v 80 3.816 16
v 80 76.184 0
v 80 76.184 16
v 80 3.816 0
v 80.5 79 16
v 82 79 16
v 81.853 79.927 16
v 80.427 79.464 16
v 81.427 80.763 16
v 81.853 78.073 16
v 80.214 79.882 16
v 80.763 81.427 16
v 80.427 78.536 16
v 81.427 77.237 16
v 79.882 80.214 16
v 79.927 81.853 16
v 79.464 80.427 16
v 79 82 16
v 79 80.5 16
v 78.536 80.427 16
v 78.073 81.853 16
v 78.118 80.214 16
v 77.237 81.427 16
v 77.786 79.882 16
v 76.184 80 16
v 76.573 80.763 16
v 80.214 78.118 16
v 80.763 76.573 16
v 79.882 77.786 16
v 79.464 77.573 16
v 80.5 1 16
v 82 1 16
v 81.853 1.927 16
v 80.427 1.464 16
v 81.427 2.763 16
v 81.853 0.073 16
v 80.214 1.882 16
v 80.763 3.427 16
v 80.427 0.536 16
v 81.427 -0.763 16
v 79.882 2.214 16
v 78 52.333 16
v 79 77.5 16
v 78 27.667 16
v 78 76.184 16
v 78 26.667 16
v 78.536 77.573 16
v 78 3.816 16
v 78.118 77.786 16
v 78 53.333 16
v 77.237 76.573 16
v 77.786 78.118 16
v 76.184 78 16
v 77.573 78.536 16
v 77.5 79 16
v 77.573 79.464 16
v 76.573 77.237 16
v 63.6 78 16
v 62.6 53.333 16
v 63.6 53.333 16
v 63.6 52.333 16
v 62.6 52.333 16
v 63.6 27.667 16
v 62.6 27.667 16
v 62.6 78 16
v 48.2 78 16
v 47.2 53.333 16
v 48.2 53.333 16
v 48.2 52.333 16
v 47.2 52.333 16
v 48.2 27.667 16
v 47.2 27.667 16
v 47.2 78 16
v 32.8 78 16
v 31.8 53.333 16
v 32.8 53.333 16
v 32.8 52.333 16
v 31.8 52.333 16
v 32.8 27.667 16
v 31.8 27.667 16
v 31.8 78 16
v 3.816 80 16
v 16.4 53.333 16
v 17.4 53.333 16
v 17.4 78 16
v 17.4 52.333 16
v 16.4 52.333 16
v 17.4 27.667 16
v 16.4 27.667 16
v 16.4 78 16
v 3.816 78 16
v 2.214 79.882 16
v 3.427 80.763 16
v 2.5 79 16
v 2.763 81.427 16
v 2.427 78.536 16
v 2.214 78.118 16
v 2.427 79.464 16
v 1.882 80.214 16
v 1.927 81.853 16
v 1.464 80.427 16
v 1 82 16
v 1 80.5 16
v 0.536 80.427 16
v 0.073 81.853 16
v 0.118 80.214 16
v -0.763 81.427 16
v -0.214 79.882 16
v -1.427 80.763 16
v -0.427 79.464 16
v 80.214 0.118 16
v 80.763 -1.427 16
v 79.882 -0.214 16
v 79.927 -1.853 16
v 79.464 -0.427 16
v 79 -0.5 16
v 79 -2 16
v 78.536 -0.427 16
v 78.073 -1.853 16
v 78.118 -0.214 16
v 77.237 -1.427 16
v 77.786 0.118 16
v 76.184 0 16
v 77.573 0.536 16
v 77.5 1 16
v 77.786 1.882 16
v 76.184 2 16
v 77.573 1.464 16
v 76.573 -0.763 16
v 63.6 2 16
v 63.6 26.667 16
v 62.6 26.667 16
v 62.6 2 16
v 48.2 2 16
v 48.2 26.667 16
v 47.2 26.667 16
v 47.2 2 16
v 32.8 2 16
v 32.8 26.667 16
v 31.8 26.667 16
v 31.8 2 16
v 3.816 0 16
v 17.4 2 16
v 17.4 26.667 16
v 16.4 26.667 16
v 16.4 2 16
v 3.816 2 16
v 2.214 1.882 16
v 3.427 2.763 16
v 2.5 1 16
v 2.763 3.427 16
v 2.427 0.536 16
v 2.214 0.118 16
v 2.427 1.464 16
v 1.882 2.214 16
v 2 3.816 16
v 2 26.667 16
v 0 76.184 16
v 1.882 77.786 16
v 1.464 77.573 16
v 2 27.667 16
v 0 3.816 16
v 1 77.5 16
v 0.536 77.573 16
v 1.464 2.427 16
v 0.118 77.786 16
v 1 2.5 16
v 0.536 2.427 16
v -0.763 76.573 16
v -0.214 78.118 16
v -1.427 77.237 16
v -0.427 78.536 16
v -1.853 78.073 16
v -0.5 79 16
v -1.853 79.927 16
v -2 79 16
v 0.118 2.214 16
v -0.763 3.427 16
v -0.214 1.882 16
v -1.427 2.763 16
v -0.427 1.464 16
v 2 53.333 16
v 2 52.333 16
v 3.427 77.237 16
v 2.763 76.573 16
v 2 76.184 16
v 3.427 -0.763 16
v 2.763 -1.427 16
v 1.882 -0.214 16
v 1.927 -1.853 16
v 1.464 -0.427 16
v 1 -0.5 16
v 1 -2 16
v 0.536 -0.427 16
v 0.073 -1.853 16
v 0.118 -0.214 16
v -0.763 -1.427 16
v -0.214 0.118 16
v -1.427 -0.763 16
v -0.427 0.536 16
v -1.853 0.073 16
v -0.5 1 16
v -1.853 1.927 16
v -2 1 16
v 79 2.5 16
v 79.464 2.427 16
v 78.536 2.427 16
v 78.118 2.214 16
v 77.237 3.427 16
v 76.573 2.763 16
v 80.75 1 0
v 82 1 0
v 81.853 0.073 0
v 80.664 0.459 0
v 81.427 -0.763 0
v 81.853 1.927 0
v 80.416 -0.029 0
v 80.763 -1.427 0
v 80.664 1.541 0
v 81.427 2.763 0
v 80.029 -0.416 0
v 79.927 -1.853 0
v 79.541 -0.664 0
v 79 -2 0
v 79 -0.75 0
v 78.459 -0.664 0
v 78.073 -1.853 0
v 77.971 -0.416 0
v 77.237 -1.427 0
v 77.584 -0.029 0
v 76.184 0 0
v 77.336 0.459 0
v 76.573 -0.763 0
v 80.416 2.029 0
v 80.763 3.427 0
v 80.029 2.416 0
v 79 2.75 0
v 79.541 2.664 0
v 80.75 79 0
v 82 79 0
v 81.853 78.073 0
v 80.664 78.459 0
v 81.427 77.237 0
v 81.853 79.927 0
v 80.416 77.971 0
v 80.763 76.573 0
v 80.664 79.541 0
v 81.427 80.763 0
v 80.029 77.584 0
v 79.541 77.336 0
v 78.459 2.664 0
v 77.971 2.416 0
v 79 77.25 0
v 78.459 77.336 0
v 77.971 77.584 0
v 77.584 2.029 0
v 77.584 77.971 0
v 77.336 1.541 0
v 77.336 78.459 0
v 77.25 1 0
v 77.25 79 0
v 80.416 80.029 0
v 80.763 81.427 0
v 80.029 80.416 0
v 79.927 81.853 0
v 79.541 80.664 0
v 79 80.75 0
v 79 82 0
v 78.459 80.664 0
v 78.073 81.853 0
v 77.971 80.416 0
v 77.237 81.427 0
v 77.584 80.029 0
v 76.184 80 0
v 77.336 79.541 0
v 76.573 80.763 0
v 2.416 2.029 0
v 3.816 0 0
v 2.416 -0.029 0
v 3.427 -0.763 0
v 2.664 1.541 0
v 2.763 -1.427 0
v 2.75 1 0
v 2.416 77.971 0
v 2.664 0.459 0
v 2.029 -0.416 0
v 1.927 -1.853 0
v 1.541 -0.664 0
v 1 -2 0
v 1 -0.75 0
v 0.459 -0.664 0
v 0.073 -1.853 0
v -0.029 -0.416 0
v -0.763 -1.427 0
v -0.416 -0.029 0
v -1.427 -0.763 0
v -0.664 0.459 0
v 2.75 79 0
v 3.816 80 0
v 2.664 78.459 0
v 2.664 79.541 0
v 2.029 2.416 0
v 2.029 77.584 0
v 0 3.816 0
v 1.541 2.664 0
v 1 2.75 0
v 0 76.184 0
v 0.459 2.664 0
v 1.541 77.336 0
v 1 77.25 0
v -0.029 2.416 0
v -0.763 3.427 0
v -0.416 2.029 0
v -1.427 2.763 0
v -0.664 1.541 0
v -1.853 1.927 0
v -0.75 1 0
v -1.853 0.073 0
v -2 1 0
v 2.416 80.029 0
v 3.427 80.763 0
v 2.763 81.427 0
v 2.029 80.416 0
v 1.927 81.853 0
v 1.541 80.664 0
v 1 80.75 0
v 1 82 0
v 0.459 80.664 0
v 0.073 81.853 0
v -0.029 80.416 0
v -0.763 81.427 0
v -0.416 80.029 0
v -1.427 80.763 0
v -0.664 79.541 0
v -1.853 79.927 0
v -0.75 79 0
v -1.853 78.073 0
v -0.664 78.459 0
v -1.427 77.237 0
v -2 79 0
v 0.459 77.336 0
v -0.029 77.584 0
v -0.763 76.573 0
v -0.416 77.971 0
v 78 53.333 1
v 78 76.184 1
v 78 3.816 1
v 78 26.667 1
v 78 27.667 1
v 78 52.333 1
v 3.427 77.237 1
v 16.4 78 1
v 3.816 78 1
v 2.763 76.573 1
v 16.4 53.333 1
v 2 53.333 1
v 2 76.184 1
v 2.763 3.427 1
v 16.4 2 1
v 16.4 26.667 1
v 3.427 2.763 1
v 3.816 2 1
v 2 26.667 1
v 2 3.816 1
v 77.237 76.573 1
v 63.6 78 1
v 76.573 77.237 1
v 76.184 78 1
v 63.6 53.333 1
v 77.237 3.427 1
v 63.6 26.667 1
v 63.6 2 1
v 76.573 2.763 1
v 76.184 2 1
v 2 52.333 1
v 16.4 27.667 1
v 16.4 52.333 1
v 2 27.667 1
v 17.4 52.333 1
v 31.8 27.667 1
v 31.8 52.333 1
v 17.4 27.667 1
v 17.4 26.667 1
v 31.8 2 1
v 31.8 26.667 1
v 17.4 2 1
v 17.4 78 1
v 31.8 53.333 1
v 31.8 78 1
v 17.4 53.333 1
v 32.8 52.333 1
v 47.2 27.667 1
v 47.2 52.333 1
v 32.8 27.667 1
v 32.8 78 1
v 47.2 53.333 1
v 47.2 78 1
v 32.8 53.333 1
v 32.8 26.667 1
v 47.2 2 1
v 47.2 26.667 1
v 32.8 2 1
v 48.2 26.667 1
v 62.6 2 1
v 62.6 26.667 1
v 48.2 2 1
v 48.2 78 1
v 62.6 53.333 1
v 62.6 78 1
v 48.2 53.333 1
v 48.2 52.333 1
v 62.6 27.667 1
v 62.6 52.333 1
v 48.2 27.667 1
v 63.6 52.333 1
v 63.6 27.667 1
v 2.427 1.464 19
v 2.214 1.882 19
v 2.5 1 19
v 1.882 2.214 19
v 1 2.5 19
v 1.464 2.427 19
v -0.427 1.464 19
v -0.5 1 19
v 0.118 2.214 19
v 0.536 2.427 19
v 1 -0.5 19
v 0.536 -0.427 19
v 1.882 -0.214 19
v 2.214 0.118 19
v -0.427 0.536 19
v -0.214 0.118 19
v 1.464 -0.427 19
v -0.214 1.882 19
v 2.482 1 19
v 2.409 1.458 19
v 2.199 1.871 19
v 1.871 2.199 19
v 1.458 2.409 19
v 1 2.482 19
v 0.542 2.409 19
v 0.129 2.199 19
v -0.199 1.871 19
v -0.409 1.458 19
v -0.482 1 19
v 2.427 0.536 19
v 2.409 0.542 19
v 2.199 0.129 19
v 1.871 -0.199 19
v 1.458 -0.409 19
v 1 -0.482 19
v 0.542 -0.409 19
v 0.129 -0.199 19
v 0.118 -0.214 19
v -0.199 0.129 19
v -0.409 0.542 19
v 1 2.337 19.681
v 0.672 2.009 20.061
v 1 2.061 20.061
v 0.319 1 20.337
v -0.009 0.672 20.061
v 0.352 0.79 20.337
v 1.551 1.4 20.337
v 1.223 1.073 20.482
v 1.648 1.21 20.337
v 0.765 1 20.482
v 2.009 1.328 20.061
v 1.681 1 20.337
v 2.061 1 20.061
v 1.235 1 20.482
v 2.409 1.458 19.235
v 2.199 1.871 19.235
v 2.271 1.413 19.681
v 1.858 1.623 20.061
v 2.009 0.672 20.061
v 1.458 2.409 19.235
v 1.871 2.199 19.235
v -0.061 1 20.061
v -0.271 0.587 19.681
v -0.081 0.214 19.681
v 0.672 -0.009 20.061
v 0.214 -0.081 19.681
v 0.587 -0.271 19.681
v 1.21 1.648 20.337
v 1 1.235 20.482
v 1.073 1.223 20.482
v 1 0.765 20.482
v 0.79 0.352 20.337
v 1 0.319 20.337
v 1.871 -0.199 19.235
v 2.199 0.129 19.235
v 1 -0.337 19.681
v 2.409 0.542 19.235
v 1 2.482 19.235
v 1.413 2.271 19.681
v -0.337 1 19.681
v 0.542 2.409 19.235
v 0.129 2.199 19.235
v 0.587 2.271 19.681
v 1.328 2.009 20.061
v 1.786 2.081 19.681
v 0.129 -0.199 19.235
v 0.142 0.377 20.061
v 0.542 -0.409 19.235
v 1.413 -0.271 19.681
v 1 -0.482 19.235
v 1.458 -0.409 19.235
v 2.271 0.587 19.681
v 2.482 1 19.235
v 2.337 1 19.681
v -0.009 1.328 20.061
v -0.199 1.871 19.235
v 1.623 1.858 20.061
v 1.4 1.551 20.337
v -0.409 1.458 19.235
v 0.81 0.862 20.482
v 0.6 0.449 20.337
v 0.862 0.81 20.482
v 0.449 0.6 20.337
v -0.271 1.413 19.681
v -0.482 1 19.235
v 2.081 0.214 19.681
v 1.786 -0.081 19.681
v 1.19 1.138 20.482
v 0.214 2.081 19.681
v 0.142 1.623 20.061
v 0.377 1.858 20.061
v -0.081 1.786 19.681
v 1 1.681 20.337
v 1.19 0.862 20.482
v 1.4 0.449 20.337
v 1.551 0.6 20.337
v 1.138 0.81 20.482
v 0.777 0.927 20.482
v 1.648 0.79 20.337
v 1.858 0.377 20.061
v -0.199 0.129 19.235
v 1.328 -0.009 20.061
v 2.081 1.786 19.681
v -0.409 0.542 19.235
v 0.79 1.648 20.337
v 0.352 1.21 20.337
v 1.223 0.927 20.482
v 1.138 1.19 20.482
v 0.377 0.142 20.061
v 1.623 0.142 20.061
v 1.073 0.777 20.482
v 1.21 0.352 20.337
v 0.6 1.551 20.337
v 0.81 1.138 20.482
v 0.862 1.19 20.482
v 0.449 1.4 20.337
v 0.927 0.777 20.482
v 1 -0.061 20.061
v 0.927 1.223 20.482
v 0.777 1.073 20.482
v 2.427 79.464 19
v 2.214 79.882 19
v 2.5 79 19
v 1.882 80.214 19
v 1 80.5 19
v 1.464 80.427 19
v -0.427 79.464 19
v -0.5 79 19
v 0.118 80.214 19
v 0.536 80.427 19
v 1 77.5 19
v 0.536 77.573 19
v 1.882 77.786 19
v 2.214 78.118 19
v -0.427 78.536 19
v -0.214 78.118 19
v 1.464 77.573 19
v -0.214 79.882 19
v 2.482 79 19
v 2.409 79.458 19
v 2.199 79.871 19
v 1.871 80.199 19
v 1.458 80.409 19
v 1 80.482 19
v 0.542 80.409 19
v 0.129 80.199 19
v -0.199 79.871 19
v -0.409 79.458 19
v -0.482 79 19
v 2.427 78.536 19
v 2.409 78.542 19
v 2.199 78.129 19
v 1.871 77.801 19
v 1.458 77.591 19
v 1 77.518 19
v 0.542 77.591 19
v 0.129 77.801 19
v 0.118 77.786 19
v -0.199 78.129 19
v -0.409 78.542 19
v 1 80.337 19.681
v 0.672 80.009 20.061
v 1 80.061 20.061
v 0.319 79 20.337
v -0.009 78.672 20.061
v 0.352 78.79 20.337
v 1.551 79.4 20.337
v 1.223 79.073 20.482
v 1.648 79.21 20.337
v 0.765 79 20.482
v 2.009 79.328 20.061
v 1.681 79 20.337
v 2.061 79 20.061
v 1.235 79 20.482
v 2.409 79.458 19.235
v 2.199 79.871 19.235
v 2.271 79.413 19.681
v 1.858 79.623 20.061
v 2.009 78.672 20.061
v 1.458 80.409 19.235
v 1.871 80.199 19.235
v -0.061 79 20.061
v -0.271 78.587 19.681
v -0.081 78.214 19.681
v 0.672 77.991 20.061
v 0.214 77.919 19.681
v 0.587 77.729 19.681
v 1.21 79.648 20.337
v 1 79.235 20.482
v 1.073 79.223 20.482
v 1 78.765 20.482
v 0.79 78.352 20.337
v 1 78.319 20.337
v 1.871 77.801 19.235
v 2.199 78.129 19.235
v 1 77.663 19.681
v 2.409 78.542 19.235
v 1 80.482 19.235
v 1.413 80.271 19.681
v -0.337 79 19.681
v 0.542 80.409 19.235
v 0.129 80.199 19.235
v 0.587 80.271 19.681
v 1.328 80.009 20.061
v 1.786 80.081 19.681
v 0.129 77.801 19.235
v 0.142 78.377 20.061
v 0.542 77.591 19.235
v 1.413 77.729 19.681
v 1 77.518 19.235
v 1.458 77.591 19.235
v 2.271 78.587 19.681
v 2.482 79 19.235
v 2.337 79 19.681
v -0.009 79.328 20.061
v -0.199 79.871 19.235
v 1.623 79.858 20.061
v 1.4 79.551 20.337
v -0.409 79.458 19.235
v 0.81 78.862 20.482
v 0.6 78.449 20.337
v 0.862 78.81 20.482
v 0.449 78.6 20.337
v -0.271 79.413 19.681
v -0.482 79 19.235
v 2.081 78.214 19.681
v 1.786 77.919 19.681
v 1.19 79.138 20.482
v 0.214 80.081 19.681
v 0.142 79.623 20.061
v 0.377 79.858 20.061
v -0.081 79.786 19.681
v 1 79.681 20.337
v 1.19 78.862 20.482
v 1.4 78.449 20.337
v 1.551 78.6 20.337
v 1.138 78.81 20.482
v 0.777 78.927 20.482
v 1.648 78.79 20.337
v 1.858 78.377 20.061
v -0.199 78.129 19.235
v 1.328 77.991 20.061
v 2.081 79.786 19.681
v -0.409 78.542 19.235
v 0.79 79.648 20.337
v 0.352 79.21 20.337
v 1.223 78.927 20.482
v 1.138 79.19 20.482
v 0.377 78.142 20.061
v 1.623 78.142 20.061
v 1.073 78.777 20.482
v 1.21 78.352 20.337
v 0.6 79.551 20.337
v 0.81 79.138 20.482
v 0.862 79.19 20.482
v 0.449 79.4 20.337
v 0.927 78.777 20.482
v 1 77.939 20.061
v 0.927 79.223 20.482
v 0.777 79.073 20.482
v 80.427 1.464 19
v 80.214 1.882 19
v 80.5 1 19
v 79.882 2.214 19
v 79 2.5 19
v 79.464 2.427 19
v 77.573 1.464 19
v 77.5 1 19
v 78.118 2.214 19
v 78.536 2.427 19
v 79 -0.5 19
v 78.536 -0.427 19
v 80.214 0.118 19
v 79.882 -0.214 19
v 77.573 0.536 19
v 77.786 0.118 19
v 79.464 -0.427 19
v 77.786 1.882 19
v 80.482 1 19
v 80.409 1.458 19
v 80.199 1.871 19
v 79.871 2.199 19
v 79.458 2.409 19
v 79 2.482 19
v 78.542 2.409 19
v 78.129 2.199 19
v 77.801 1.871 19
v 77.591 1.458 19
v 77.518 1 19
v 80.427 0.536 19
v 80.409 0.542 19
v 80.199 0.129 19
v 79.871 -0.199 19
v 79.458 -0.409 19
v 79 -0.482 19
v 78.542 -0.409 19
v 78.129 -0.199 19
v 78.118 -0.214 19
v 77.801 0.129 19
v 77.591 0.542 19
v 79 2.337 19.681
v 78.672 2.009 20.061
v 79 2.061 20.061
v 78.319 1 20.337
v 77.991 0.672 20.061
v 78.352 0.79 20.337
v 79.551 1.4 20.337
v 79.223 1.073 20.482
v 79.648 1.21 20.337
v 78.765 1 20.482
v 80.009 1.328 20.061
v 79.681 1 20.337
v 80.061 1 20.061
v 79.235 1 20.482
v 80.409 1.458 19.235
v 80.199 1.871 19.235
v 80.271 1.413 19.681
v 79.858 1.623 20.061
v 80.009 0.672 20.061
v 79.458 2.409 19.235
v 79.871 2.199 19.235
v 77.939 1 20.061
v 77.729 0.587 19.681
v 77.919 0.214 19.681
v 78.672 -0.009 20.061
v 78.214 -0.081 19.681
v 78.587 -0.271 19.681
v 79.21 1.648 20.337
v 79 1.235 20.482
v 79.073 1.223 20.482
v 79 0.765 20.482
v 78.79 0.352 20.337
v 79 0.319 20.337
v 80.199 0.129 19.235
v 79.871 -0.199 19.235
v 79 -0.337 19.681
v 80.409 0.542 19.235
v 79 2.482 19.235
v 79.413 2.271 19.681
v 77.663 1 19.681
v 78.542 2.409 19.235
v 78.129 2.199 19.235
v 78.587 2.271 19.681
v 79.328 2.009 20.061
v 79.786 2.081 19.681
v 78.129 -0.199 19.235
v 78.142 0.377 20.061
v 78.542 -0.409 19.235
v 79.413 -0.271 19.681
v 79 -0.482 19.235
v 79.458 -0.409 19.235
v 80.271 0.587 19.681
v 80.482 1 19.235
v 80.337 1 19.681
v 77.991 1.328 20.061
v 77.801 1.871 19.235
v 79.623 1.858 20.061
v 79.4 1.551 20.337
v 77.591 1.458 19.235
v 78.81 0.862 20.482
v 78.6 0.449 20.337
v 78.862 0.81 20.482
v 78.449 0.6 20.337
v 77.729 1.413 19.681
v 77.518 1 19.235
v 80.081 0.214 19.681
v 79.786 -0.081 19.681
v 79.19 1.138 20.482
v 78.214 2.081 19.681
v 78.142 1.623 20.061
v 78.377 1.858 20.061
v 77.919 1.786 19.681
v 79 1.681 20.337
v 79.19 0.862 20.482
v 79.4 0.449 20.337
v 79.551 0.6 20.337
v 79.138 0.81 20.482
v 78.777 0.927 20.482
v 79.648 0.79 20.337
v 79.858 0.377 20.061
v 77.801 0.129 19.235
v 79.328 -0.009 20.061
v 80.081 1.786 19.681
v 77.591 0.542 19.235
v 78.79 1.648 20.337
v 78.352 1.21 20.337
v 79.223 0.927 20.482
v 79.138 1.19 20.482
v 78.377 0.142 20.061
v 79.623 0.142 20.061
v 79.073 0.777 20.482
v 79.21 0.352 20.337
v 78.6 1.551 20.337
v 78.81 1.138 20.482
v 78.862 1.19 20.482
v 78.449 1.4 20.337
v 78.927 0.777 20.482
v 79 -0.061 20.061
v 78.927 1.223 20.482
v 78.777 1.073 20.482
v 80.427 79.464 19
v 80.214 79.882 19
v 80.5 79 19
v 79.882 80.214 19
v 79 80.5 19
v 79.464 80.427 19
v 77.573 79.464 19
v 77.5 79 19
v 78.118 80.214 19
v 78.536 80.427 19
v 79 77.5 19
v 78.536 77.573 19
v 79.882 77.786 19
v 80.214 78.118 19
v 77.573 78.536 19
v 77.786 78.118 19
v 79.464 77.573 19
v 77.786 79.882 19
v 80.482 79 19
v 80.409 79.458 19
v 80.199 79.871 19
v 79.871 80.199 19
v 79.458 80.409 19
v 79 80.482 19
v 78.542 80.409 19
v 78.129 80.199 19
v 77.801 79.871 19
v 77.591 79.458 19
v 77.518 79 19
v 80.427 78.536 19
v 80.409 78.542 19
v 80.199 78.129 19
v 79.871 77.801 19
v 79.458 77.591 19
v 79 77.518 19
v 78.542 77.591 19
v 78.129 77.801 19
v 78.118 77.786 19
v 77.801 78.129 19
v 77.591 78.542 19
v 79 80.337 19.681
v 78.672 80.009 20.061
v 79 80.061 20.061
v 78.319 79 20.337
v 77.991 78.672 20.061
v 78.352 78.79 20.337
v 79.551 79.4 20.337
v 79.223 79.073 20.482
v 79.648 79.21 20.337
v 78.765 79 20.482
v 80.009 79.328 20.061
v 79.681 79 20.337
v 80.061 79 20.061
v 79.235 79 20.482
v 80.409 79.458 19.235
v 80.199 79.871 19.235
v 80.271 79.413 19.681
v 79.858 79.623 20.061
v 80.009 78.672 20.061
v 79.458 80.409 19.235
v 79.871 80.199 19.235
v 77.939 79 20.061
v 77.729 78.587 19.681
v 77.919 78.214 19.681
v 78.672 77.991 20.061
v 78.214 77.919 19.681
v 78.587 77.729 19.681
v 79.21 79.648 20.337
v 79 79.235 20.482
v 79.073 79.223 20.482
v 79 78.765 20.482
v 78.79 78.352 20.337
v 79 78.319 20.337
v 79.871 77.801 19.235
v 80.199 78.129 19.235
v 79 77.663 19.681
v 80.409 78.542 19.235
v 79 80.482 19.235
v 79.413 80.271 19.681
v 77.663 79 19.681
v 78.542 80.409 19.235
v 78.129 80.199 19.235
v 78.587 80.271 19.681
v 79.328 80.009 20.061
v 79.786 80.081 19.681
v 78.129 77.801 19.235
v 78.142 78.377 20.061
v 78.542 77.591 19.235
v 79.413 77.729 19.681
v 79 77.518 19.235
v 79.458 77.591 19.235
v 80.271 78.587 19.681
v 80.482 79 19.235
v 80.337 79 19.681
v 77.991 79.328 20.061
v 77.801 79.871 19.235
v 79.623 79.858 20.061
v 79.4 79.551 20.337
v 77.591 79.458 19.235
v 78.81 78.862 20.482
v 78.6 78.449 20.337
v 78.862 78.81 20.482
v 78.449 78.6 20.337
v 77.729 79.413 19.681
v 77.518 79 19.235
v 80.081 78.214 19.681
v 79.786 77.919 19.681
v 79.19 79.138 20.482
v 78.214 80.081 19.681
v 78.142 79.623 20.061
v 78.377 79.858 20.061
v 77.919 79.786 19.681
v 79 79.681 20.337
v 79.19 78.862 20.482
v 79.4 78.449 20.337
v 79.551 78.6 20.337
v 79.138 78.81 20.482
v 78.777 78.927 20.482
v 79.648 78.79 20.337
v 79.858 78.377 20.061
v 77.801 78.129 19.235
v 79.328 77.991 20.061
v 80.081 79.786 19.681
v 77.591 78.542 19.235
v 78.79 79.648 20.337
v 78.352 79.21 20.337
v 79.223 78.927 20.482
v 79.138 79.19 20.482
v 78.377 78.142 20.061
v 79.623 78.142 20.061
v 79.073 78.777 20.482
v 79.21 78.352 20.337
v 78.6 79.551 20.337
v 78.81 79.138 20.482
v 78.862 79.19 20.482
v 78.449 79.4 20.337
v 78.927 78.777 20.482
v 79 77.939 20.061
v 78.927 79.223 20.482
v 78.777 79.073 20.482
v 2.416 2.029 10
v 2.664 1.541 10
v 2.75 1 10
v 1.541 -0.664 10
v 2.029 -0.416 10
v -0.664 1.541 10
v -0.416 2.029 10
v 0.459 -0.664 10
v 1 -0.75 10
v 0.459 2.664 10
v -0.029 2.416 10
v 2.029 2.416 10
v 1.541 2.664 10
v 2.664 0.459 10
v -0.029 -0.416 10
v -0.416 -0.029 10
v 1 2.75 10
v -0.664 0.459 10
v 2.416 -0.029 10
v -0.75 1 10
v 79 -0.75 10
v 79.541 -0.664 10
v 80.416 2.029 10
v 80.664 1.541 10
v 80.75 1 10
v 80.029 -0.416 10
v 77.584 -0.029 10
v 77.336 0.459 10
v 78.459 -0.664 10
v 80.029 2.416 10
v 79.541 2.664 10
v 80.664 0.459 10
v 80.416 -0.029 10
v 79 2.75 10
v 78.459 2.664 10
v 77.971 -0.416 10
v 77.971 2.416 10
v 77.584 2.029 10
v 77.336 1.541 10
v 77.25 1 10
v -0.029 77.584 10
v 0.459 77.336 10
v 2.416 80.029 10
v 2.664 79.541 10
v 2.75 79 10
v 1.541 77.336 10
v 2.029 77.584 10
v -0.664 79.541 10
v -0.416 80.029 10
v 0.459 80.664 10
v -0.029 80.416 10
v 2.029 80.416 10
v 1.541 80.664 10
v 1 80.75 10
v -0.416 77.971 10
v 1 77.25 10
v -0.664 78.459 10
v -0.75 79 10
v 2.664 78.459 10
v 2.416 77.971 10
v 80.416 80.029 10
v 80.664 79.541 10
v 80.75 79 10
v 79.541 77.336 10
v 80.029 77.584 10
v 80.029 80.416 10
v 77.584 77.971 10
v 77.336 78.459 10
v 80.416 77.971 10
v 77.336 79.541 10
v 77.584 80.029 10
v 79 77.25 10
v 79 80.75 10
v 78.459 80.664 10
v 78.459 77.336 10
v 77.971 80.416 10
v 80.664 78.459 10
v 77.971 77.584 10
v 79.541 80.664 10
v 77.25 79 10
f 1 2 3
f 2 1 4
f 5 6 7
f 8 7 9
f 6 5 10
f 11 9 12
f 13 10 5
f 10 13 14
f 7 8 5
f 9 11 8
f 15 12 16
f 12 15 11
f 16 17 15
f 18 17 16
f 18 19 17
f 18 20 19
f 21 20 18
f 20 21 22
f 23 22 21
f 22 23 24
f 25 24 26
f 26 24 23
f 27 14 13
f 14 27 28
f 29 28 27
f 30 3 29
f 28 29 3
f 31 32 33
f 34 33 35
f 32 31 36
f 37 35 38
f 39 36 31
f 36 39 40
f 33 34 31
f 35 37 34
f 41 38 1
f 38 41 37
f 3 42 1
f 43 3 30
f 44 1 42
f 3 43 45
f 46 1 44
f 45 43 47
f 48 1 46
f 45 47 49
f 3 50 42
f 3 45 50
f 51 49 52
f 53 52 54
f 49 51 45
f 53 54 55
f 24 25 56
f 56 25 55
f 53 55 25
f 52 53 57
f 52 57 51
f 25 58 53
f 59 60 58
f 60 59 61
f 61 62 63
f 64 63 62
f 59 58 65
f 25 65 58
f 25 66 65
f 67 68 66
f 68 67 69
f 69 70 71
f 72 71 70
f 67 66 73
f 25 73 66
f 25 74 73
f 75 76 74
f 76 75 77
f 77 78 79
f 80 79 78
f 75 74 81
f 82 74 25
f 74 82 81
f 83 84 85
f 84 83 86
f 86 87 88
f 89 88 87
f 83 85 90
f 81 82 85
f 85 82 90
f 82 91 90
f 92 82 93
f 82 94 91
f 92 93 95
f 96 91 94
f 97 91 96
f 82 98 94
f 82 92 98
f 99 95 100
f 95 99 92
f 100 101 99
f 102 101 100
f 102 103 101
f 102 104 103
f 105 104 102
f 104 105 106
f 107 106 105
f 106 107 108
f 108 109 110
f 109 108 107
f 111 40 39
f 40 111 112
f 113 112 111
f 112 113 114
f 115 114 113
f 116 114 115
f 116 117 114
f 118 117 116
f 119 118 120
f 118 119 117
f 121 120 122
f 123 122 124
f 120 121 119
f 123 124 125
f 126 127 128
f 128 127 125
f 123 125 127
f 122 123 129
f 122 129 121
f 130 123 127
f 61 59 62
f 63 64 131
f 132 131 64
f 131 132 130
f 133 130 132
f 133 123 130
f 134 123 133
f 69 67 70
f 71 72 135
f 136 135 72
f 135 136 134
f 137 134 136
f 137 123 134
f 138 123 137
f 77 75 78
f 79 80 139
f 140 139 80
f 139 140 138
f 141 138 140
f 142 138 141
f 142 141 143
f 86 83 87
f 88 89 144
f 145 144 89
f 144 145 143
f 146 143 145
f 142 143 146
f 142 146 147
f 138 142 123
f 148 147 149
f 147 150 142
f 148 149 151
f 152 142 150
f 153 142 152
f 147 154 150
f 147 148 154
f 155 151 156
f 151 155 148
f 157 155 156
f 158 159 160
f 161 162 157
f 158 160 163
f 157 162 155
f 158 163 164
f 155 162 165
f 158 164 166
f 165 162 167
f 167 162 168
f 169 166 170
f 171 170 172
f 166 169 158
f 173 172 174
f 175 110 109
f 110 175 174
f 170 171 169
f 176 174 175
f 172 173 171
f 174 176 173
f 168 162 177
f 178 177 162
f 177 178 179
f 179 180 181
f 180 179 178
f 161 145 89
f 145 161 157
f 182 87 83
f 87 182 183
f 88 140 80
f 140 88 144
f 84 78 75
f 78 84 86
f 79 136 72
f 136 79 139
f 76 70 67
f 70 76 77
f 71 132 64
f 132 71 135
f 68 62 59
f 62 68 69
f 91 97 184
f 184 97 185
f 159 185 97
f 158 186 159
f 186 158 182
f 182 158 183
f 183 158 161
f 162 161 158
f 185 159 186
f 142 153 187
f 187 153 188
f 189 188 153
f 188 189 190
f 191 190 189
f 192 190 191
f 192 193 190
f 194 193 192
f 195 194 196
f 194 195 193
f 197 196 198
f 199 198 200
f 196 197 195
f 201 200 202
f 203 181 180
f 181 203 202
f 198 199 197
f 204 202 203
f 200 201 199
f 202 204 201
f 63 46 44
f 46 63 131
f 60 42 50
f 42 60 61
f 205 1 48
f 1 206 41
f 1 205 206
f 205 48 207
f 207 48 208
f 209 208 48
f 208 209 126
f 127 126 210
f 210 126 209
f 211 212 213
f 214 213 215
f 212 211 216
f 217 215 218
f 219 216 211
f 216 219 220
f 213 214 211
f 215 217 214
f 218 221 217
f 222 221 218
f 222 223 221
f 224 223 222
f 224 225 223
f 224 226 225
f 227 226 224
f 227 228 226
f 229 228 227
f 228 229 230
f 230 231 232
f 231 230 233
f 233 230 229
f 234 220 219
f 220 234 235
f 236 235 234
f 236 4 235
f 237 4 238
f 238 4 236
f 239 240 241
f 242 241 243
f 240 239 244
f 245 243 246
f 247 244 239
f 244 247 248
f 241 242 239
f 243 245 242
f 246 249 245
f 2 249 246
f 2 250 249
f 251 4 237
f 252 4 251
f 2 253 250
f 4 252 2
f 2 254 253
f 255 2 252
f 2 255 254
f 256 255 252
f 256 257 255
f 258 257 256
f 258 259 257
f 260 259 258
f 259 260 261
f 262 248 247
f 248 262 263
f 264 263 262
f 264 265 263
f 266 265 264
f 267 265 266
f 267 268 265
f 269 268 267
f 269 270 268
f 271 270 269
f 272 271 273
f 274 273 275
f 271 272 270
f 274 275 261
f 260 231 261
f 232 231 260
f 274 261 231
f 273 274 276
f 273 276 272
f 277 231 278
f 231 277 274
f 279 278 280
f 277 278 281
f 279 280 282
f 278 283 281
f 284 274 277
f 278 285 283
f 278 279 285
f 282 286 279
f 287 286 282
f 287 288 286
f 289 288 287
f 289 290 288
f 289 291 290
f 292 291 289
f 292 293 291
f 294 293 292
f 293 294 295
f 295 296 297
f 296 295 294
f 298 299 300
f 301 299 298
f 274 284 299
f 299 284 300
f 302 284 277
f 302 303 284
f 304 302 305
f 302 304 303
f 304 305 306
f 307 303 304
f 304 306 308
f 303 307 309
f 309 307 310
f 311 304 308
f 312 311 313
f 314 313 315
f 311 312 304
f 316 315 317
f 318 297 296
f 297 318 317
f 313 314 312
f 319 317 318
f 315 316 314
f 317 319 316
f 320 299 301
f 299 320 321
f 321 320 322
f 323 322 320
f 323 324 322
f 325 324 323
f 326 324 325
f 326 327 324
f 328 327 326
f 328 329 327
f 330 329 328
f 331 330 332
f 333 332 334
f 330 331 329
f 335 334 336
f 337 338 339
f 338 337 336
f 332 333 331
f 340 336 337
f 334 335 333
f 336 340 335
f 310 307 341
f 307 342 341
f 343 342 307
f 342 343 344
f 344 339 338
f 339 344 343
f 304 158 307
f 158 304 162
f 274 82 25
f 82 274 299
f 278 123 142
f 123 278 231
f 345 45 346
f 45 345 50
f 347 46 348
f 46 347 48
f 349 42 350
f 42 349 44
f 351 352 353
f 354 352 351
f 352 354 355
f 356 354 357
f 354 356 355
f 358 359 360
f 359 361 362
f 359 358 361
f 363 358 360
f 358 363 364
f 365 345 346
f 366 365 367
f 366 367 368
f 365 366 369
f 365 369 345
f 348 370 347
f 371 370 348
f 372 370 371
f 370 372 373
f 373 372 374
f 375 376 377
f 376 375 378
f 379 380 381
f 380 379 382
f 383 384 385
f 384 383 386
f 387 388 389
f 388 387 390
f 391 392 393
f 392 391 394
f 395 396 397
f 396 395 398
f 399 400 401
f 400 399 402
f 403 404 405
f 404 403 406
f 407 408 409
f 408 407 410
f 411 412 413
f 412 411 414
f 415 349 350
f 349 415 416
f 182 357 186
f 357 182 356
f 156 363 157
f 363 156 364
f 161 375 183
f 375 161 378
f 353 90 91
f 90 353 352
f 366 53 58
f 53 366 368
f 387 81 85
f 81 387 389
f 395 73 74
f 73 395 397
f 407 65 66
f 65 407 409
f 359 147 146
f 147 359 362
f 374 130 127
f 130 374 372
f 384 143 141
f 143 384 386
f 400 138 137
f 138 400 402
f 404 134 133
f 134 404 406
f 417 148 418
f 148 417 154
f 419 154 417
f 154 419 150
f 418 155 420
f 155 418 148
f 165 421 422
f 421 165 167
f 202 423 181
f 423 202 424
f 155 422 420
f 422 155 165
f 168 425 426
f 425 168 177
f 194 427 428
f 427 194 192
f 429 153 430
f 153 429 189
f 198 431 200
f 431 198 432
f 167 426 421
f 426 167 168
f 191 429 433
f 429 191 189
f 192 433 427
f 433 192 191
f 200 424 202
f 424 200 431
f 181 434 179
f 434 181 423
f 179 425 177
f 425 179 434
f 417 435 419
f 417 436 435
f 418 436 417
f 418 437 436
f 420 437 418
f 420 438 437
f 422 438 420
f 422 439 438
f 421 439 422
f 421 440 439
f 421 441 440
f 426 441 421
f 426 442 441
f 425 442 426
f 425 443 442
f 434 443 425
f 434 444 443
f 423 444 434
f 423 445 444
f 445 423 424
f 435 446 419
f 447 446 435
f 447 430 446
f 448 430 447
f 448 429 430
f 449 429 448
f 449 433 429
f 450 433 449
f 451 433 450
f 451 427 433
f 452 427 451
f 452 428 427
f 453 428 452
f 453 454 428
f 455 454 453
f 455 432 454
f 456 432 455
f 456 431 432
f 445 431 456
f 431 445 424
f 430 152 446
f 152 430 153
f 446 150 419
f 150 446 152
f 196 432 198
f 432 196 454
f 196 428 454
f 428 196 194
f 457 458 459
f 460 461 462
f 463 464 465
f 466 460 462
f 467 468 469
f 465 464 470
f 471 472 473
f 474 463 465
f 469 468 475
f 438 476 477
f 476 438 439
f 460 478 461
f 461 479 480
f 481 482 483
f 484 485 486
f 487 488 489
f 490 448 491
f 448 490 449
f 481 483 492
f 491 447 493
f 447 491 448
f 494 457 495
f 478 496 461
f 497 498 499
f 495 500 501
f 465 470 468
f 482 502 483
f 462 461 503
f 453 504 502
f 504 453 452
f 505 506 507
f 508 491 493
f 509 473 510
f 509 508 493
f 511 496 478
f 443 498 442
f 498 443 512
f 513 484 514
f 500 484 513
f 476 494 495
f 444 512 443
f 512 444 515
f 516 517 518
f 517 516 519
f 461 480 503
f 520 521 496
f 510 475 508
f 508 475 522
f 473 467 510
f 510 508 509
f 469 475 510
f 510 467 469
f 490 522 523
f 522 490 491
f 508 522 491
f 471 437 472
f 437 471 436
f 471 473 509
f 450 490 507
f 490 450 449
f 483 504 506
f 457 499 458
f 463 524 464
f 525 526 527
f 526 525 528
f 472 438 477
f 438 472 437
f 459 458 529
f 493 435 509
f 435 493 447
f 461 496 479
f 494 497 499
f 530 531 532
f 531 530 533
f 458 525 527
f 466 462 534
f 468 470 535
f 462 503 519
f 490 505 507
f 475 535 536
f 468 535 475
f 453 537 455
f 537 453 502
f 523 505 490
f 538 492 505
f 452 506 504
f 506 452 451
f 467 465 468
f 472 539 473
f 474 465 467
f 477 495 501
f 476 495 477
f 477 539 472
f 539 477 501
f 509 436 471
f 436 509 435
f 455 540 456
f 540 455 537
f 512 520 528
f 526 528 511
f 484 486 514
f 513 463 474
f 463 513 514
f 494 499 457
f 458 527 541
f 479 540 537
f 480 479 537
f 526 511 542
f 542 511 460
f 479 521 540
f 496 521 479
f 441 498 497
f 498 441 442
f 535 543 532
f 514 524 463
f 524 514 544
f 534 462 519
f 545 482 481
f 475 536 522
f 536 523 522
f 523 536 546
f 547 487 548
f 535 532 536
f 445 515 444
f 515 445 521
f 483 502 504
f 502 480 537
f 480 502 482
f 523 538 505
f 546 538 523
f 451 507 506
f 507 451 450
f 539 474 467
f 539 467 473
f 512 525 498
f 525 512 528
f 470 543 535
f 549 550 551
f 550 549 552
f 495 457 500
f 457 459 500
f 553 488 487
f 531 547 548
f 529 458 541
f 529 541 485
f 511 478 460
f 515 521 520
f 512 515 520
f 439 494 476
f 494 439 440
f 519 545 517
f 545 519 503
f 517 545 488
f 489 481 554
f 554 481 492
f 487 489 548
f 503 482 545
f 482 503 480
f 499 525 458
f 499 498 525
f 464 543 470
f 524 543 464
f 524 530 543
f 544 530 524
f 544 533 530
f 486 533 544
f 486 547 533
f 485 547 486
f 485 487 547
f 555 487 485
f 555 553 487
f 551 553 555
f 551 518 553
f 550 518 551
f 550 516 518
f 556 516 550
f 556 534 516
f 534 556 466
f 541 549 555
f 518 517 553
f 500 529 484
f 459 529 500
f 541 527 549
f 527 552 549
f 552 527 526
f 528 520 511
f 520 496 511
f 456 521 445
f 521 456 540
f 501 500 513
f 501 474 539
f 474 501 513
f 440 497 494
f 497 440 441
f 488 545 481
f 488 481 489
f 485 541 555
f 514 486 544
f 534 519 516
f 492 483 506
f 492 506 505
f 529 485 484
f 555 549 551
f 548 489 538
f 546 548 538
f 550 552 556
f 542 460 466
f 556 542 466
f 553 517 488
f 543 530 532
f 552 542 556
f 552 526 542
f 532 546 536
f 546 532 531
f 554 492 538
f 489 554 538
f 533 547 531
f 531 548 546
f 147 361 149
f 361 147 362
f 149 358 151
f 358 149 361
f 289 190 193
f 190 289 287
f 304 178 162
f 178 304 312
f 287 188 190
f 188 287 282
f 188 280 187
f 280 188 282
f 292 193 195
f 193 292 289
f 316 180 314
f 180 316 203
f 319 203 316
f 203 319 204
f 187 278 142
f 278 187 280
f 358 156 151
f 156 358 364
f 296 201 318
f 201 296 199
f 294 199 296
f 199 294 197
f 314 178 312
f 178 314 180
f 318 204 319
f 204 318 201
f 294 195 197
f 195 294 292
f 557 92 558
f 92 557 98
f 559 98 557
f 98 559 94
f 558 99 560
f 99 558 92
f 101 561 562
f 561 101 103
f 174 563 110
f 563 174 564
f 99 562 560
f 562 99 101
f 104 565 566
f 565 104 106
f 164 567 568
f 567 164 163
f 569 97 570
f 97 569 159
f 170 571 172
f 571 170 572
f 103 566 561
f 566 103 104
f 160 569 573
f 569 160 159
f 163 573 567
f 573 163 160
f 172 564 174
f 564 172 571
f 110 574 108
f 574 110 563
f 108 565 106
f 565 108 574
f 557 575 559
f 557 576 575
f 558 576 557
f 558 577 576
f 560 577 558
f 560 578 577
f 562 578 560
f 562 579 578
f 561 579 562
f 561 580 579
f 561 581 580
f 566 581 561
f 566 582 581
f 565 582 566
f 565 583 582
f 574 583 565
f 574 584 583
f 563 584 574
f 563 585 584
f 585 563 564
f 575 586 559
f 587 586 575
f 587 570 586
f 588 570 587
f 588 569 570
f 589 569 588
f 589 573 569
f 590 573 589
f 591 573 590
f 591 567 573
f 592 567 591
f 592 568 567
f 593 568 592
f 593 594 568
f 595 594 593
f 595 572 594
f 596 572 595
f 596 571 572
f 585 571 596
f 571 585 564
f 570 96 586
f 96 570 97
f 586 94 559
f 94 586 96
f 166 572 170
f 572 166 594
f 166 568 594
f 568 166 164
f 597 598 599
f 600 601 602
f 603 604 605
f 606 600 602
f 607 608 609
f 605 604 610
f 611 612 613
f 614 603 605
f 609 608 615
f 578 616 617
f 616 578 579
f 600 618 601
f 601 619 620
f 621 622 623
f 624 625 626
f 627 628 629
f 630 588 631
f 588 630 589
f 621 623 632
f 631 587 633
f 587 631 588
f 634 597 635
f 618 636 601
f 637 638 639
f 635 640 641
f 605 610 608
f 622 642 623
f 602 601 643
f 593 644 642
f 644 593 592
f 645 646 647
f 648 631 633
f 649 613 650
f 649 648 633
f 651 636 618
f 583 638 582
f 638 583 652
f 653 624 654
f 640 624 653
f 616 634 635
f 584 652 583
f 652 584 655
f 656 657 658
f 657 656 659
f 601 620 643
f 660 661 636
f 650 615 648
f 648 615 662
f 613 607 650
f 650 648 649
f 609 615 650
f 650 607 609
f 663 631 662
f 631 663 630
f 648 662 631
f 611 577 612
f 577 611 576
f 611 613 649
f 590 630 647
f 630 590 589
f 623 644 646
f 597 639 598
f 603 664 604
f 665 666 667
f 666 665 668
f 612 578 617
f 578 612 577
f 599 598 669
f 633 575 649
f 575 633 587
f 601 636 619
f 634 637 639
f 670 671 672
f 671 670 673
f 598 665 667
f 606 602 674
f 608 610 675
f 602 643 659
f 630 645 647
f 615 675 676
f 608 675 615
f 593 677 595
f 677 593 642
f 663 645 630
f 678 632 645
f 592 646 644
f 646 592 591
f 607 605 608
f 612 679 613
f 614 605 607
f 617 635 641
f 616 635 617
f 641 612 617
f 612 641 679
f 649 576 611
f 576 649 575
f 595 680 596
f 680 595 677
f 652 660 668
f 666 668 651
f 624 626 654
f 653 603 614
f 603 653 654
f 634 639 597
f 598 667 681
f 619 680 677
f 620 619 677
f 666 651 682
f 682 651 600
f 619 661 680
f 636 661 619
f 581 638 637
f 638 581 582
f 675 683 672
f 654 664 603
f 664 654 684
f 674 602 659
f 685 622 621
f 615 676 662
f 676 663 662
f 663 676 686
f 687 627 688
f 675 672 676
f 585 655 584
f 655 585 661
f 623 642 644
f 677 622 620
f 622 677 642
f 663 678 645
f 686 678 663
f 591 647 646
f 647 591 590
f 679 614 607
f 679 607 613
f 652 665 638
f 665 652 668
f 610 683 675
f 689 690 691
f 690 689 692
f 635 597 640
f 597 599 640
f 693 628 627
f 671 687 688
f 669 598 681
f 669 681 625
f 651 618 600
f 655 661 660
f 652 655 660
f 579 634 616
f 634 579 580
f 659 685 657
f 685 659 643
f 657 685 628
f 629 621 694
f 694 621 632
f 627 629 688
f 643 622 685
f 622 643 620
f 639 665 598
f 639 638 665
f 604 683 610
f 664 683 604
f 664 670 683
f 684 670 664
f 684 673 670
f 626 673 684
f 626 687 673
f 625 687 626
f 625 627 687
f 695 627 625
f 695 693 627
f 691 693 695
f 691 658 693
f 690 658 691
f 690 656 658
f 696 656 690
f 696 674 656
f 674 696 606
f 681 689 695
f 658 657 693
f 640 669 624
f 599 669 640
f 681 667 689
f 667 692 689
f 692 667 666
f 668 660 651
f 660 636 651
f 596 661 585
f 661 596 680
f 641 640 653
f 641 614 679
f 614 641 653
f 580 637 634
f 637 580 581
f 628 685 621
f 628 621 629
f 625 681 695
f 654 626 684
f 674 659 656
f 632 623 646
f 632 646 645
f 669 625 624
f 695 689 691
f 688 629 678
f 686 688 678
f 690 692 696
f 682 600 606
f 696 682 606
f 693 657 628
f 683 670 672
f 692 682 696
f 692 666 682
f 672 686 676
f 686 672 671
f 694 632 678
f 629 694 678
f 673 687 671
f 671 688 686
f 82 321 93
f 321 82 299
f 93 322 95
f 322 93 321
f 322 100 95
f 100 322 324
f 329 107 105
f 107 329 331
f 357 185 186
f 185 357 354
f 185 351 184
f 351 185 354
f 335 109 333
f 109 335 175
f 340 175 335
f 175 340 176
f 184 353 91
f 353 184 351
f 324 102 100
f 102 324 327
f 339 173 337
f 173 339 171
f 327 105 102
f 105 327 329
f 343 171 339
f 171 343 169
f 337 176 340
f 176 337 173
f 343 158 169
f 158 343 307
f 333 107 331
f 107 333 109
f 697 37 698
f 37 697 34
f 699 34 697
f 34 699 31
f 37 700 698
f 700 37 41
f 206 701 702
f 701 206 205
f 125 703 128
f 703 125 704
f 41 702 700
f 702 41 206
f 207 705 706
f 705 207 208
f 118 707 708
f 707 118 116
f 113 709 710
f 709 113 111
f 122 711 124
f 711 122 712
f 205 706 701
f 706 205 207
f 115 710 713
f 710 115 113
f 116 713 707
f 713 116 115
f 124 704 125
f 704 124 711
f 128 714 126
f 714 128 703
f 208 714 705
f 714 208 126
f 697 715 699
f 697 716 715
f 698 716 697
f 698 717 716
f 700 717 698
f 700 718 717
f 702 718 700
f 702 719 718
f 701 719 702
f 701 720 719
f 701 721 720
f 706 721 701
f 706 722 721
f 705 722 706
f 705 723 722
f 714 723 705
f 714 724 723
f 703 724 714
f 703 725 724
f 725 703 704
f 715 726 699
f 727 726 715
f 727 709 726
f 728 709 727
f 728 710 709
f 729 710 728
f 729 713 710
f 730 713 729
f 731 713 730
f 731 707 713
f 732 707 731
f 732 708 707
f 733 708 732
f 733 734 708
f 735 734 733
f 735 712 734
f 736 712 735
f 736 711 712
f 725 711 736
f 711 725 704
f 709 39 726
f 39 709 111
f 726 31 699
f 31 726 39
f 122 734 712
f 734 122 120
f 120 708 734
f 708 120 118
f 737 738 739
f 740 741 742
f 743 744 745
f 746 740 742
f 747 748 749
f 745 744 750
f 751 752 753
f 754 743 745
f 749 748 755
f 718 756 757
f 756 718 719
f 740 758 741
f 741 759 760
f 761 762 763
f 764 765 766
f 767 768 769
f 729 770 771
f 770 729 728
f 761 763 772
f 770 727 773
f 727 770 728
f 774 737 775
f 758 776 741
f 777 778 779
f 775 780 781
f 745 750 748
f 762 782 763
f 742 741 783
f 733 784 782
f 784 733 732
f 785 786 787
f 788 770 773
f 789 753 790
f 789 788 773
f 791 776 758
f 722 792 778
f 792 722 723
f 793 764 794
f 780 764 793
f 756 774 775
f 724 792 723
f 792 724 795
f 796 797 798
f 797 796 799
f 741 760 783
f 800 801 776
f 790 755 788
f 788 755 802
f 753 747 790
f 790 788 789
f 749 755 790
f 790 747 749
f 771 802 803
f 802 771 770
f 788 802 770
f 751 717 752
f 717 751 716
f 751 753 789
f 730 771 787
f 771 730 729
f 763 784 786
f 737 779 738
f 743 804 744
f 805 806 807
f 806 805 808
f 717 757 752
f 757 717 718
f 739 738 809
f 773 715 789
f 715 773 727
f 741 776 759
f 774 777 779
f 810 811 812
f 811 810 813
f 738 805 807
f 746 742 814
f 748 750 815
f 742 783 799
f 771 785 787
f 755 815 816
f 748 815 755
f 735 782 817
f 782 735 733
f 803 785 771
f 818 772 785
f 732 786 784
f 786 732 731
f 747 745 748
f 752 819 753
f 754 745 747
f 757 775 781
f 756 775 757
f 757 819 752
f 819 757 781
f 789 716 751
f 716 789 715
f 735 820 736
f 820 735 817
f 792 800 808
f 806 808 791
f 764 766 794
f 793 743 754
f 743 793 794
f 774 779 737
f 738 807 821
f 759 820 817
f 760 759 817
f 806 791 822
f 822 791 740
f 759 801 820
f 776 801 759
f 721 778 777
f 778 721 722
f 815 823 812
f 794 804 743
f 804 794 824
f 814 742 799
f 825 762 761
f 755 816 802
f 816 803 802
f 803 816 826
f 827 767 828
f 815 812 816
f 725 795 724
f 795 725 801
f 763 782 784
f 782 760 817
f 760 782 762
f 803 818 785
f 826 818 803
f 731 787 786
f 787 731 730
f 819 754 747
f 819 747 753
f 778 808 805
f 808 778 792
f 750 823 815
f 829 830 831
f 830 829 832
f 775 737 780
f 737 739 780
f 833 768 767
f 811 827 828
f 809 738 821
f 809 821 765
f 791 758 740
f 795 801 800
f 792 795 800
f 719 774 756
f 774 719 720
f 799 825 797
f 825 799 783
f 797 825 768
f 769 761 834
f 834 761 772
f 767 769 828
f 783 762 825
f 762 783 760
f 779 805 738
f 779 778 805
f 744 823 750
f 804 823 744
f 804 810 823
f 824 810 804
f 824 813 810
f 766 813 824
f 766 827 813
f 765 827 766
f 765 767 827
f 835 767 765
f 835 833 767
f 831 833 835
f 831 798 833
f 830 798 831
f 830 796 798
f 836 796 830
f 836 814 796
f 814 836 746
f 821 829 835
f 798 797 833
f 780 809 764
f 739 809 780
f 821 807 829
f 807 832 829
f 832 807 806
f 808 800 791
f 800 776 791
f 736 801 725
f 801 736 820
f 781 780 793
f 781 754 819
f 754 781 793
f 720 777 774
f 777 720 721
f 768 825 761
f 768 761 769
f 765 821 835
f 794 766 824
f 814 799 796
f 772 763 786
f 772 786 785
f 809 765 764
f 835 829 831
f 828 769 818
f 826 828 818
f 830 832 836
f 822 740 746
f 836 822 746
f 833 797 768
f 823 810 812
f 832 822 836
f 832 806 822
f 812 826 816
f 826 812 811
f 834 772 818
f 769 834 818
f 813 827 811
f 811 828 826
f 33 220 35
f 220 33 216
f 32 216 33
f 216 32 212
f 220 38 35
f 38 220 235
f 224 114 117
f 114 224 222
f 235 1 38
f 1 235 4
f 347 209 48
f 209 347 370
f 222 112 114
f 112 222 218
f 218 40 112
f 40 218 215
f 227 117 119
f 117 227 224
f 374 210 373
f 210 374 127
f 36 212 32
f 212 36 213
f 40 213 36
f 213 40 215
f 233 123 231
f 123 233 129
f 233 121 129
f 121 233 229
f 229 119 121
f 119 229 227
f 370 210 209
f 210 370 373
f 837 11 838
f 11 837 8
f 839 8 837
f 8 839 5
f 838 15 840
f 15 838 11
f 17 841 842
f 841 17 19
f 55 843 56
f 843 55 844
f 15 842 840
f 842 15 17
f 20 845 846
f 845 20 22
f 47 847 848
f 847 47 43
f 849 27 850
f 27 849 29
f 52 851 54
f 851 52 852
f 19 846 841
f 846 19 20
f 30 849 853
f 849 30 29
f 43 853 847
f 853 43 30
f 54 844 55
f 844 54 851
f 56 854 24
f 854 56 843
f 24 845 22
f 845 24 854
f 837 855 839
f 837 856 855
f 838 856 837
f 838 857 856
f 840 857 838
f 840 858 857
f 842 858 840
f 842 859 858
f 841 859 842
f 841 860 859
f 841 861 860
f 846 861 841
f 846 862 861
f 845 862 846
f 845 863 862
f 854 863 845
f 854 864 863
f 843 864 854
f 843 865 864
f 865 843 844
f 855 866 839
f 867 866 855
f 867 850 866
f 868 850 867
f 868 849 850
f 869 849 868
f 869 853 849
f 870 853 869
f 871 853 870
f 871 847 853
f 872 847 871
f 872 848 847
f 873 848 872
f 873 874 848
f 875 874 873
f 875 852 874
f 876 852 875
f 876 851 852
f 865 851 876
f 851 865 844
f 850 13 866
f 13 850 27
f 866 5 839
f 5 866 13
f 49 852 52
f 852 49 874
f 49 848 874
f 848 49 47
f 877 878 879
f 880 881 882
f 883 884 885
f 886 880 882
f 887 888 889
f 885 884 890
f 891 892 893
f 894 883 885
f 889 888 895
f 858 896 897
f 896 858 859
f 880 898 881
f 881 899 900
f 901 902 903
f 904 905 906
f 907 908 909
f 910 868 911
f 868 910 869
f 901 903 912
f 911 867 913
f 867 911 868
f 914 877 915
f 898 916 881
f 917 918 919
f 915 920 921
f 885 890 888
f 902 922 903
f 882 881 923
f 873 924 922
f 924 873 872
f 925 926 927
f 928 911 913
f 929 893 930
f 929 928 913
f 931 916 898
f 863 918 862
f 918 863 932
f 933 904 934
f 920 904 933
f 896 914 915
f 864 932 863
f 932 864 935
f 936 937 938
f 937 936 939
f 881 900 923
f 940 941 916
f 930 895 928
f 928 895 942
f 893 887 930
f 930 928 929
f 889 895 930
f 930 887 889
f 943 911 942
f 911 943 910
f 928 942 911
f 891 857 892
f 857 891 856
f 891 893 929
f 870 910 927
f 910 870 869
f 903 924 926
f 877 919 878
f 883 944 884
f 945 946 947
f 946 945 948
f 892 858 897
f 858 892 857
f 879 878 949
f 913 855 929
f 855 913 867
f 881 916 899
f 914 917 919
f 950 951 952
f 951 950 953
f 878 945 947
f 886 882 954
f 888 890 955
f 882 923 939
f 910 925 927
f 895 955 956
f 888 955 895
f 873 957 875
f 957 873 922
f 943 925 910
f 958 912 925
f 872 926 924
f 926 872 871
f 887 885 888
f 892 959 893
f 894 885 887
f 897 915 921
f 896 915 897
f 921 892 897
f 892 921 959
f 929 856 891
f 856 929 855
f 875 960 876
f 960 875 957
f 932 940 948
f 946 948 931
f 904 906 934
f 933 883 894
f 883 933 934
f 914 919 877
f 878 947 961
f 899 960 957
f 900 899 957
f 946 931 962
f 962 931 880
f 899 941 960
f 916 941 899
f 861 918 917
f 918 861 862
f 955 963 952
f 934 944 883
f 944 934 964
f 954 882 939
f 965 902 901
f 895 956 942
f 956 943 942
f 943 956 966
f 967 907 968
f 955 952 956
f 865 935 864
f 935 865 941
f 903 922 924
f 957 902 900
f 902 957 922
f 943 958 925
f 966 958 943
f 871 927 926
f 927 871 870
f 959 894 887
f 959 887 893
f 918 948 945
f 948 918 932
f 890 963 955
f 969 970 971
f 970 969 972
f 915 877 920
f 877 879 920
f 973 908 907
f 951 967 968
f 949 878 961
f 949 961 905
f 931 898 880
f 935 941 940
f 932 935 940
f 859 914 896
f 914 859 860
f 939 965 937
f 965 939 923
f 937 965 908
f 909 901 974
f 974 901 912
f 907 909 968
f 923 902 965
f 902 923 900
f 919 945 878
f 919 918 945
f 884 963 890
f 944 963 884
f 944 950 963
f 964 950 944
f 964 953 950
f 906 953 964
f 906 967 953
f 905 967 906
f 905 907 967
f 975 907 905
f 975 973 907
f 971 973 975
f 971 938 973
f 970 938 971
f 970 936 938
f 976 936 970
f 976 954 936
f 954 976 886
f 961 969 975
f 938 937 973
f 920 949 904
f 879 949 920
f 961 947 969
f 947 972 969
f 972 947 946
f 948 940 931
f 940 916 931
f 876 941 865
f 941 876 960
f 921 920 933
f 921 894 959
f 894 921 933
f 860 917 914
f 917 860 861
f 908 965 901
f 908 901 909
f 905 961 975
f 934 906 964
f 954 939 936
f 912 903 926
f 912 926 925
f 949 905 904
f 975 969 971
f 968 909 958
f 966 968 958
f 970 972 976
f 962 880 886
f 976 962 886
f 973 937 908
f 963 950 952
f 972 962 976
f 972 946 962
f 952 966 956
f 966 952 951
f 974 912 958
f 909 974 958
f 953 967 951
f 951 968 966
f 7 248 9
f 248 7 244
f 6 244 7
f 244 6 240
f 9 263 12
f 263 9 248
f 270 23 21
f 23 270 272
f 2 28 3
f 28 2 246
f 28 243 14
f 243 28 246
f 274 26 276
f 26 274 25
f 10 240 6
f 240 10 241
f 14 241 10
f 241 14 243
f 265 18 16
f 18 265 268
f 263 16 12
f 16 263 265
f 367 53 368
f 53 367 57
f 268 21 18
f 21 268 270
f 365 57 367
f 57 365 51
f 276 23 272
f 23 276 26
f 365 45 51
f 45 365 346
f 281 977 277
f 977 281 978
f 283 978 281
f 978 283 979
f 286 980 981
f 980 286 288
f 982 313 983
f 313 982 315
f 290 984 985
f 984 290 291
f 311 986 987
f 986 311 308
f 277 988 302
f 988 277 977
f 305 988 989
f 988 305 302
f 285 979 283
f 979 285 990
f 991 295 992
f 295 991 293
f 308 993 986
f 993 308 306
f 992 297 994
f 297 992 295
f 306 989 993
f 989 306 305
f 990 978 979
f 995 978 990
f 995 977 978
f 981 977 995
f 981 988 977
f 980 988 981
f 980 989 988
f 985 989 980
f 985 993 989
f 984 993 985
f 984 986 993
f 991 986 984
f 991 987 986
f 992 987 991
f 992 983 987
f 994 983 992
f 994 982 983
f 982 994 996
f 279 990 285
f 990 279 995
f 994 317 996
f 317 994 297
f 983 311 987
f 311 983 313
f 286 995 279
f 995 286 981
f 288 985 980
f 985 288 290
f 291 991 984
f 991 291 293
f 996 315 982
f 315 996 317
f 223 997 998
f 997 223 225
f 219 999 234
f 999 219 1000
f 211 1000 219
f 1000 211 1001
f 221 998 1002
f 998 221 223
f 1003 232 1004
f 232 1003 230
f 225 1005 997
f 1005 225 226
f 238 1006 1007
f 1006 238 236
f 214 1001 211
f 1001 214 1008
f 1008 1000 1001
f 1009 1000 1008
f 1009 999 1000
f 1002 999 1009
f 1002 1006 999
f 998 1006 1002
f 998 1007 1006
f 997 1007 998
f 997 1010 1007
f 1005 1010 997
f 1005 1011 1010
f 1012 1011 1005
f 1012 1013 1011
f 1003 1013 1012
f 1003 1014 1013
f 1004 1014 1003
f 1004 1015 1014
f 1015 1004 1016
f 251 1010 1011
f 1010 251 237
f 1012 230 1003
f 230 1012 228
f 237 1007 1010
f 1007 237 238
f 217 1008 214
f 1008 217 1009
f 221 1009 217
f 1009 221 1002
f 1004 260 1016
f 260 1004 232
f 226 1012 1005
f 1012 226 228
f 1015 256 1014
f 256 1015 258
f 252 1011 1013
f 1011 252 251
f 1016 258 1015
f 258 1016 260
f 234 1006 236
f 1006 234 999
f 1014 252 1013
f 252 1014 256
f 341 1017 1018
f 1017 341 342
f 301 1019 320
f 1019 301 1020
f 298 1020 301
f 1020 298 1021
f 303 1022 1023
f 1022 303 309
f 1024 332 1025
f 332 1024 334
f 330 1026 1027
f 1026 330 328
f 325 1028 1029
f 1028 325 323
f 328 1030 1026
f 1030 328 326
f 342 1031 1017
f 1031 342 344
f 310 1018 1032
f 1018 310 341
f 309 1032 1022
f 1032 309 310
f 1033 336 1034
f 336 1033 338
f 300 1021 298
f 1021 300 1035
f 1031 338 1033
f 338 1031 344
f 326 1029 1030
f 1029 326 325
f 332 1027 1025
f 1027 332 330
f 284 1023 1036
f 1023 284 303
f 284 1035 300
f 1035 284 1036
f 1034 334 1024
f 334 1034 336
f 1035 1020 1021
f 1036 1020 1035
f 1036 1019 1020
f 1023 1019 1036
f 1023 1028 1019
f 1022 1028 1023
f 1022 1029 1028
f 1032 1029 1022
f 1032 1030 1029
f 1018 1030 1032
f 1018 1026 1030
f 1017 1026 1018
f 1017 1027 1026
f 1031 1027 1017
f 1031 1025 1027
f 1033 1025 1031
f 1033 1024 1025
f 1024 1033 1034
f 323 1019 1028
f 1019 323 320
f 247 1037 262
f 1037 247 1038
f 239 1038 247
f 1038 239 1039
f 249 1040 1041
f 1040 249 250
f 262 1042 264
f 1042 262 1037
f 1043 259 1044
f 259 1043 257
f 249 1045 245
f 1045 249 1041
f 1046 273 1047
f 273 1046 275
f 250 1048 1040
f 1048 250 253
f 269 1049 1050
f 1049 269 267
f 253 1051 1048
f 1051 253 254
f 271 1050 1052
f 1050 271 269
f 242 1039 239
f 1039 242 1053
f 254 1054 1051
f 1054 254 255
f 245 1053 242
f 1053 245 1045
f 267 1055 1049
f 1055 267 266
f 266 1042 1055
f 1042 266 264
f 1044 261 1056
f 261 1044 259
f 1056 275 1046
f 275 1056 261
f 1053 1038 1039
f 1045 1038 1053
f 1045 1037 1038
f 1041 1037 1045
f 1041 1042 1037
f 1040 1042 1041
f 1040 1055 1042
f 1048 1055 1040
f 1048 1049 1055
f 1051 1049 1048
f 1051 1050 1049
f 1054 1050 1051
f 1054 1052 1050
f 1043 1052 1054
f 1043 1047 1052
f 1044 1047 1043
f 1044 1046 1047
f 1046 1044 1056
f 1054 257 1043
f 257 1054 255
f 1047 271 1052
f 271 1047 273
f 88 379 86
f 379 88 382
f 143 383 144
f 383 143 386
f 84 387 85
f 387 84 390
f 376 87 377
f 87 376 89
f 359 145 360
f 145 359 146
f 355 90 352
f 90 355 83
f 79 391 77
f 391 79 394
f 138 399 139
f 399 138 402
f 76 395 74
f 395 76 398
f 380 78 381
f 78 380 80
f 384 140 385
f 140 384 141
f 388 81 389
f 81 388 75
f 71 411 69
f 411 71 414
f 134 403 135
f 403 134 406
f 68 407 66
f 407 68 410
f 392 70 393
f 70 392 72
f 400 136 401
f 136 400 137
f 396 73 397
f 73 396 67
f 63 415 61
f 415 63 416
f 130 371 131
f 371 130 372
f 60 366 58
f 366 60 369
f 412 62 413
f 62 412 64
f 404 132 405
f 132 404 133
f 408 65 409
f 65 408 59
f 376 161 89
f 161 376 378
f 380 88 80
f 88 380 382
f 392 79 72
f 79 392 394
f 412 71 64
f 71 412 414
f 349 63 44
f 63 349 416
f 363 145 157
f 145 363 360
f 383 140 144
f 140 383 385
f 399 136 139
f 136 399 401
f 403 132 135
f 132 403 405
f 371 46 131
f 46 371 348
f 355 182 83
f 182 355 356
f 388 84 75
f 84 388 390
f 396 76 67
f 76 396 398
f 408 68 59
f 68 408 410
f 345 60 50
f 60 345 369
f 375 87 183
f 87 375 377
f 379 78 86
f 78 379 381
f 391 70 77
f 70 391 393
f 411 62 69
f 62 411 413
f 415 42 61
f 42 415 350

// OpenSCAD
height = 16;
wall_outer_thickness = 2;
base_thickness = 1;
wall_inner_thickness = 1;
slots_x = 5;
slots_y = 3;

$fn = 20;
pin_diameter = 3;
pin_height = 3;
pin_hole_diameter = 3.5;
pin_hole_height = 10;
corner_outer_diameter = 6;
base_side = 80;
base_size = [base_side, base_side, height];

function corner_coords(i, j) = [
    i * base_side + (1/2-i)*wall_outer_thickness, 
    j * base_side + (1/2-j)*wall_outer_thickness, 
    0];

module corner(i, j) {
    translate(corner_coords(i, j))
        {
            cylinder(h = height, d = corner_outer_diameter);
            translate([0, 0, height]) {
                cylinder(h = pin_height, d = pin_diameter);
                translate([0, 0, pin_height])
                    sphere(d = pin_diameter);
            }
        }
}

module pin_hole(i, j) {
    translate(corner_coords(i, j))
        translate([0, 0, -1])
            cylinder(h = pin_hole_height+1, d = pin_hole_diameter);
}

union() {
    difference() {
        union() {
            difference() {
                cube(base_size, center = false);
                translate([wall_outer_thickness, wall_outer_thickness, base_thickness])
                    cube(base_size - [wall_outer_thickness*2, wall_outer_thickness*2, 0]);
            }
            corner(0, 0);
            corner(0, 1);
            corner(1, 0);
            corner(1, 1);
        }
        pin_hole(0, 0);
        pin_hole(1, 0);
        pin_hole(0, 1);
        pin_hole(1, 1);
    }
}

inner_space = base_side - wall_outer_thickness*2 + wall_inner_thickness;
x_ofs = inner_space / slots_x;
y_ofs = inner_space / slots_y;
translate([wall_outer_thickness, 0, 0])
    for (i = [1:slots_x-1]) {
        translate([i*x_ofs - wall_inner_thickness, 0, 0])
            cube([wall_inner_thickness, base_side, height]);
    }

translate([0, wall_outer_thickness, 0])
    for (i = [1:slots_y-1]) {
        translate([0, i*y_ofs - wall_inner_thickness, 0])
            cube([base_side, wall_inner_thickness, height]);
    }
